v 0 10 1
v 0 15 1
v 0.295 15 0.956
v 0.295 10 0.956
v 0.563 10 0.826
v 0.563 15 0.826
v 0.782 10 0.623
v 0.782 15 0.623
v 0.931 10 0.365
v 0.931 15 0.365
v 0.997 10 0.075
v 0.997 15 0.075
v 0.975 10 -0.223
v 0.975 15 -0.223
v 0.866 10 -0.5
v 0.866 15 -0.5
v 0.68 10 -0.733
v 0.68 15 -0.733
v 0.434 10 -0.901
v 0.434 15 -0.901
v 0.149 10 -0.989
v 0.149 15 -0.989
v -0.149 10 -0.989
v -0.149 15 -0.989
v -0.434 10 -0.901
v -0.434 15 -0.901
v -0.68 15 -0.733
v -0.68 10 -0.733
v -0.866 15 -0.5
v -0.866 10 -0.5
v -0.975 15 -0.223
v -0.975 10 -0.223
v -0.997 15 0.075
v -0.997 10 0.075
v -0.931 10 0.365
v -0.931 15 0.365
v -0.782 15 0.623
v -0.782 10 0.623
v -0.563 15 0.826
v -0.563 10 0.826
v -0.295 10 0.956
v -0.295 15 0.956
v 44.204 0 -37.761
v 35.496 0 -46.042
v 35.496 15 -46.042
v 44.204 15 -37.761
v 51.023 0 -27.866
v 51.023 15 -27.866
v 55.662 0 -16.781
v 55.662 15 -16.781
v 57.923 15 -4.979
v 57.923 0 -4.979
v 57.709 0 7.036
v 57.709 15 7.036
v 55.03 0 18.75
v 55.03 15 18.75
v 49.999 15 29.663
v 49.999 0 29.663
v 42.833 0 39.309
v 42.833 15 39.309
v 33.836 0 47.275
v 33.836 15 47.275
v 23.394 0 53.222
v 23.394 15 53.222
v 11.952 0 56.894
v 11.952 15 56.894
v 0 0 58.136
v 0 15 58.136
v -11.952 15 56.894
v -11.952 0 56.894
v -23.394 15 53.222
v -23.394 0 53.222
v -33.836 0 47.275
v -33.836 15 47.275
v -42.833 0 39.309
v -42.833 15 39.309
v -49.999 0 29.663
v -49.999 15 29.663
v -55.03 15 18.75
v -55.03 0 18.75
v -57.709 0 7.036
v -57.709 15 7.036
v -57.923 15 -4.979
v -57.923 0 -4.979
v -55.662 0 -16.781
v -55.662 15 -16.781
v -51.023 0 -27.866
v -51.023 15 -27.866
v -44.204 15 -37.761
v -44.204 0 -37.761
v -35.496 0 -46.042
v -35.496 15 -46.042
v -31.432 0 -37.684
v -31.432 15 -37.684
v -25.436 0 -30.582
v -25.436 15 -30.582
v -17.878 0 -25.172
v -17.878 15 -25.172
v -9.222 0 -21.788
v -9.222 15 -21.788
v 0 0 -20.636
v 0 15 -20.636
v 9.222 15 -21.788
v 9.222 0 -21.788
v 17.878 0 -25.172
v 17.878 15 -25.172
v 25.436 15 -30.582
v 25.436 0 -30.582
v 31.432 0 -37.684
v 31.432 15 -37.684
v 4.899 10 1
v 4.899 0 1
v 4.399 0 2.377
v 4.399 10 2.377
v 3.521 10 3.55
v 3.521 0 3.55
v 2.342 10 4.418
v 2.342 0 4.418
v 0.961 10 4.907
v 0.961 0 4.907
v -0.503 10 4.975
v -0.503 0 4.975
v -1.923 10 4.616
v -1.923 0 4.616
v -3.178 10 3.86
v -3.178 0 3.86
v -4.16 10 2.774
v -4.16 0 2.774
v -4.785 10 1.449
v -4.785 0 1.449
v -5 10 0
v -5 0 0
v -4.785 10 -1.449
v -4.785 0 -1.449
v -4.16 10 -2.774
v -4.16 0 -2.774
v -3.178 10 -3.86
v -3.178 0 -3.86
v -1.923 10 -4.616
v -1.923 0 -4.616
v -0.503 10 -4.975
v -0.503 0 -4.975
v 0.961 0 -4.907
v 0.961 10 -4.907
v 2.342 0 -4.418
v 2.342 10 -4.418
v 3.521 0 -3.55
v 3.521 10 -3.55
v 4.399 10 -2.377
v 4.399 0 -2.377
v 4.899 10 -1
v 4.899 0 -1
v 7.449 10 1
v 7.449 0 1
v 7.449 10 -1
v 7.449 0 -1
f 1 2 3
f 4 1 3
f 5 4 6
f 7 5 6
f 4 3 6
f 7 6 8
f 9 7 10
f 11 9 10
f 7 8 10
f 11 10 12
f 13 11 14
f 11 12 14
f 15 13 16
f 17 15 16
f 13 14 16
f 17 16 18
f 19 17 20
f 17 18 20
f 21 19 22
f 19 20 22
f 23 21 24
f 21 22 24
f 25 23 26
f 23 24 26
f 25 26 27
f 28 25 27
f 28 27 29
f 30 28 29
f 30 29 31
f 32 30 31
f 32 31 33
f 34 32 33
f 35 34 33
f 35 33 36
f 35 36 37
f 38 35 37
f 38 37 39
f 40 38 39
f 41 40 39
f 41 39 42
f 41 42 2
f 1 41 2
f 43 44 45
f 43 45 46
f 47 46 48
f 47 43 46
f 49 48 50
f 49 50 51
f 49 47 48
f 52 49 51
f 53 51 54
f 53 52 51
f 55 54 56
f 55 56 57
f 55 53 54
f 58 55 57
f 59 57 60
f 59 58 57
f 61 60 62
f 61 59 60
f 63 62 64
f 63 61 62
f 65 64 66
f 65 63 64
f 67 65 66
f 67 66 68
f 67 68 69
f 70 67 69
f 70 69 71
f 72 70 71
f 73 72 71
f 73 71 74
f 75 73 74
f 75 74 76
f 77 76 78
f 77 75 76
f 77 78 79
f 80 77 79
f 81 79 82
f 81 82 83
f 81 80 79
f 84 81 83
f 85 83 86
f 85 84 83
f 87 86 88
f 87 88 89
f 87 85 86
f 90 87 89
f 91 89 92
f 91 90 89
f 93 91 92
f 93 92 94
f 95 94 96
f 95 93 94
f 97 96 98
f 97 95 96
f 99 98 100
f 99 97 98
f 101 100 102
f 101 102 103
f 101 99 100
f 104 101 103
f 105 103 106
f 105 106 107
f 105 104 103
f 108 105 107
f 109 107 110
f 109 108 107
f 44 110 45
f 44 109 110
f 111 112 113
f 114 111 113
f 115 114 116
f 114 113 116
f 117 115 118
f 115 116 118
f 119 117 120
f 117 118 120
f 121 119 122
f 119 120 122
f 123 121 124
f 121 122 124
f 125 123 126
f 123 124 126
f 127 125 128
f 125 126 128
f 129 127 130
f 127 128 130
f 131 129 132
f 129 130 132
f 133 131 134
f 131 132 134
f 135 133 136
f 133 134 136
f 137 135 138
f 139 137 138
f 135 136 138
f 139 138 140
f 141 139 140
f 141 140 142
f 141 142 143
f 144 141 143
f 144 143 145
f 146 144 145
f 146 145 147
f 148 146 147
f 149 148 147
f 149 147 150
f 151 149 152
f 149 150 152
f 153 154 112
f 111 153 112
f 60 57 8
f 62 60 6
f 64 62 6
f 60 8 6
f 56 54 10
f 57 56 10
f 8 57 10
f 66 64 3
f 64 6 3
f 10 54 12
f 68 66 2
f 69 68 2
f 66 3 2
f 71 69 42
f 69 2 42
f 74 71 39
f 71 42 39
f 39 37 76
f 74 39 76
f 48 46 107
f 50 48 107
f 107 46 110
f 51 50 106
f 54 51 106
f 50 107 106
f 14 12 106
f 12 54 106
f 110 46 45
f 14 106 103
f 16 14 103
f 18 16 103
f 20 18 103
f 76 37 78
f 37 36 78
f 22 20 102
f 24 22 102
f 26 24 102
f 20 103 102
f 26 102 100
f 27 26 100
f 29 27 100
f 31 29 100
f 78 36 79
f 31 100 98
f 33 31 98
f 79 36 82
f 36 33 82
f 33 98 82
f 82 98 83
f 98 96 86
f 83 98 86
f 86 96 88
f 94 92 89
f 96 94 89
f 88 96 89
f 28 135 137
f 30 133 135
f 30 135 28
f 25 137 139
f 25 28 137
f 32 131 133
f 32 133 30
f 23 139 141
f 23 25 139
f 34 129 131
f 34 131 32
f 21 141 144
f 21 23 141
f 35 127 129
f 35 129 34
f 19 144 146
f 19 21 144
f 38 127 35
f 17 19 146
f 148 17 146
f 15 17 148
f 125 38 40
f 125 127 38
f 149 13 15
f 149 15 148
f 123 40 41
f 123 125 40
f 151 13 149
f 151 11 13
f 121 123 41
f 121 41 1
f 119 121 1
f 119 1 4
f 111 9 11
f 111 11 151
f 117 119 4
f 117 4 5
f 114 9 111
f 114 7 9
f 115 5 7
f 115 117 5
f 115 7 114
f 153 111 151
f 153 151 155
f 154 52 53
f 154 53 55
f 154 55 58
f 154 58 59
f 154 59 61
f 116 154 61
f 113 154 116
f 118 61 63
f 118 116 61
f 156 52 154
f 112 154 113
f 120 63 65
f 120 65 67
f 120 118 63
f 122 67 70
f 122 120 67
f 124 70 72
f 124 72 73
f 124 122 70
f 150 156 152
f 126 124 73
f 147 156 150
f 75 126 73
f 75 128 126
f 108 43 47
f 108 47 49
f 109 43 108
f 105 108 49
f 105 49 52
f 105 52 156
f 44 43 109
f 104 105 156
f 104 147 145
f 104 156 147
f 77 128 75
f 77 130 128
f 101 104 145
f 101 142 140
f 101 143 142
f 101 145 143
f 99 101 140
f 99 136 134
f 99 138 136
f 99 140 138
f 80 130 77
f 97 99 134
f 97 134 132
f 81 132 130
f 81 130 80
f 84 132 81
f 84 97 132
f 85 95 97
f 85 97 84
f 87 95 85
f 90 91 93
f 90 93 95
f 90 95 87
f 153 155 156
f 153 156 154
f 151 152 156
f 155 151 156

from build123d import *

# Parameters (mm, degrees)
BOSS_EXTRUDE1_DEPTH = 15
CUT_EXTRUDE1_DEPTH  = 10
SKETCH3_R           = 1
CUT_EXTRUDE2_DEPTH  = 10


with BuildPart() as part:
    # Sketch1 → Boss-Extrude1 (new body)
    with BuildSketch(Plane(origin=(0, 0, 0), x_dir=(1, 0, 0), z_dir=(0, 1, 0))):
        with BuildLine():
            ThreePointArc((-35.496119508, 46.04177293), (0, 20.636213797), (35.496119508, 46.04177293))
            ThreePointArc((35.496119508, 46.04177293), (0, -58.136213797), (-35.496119508, 46.04177293))
        make_face()
    extrude(amount=BOSS_EXTRUDE1_DEPTH)

    # Sketch2 → Cut-Extrude1 (cut)
    with BuildSketch(Plane.XZ):
        with BuildLine():
            Line((7.448979486, 1), (4.898979486, 1))
            ThreePointArc((4.898979486, 1), (-5, 0), (4.898979486, -1))
            Line((4.898979486, -1), (7.448979486, -1))
            Line((7.448979486, -1), (7.448979486, 1))
        make_face()
    extrude(amount=-CUT_EXTRUDE1_DEPTH, mode=Mode.SUBTRACT)

    # Sketch3 → Cut-Extrude2 (cut)
    with BuildSketch(Plane(origin=(0, 15, 0), x_dir=(1, 0, 0), z_dir=(0, 1, 0))):
        with Locations(Location((0, 0, 0), (0, 0, 270))):
            Circle(SKETCH3_R)
    extrude(amount=-CUT_EXTRUDE2_DEPTH, mode=Mode.SUBTRACT)


solid = part.part
